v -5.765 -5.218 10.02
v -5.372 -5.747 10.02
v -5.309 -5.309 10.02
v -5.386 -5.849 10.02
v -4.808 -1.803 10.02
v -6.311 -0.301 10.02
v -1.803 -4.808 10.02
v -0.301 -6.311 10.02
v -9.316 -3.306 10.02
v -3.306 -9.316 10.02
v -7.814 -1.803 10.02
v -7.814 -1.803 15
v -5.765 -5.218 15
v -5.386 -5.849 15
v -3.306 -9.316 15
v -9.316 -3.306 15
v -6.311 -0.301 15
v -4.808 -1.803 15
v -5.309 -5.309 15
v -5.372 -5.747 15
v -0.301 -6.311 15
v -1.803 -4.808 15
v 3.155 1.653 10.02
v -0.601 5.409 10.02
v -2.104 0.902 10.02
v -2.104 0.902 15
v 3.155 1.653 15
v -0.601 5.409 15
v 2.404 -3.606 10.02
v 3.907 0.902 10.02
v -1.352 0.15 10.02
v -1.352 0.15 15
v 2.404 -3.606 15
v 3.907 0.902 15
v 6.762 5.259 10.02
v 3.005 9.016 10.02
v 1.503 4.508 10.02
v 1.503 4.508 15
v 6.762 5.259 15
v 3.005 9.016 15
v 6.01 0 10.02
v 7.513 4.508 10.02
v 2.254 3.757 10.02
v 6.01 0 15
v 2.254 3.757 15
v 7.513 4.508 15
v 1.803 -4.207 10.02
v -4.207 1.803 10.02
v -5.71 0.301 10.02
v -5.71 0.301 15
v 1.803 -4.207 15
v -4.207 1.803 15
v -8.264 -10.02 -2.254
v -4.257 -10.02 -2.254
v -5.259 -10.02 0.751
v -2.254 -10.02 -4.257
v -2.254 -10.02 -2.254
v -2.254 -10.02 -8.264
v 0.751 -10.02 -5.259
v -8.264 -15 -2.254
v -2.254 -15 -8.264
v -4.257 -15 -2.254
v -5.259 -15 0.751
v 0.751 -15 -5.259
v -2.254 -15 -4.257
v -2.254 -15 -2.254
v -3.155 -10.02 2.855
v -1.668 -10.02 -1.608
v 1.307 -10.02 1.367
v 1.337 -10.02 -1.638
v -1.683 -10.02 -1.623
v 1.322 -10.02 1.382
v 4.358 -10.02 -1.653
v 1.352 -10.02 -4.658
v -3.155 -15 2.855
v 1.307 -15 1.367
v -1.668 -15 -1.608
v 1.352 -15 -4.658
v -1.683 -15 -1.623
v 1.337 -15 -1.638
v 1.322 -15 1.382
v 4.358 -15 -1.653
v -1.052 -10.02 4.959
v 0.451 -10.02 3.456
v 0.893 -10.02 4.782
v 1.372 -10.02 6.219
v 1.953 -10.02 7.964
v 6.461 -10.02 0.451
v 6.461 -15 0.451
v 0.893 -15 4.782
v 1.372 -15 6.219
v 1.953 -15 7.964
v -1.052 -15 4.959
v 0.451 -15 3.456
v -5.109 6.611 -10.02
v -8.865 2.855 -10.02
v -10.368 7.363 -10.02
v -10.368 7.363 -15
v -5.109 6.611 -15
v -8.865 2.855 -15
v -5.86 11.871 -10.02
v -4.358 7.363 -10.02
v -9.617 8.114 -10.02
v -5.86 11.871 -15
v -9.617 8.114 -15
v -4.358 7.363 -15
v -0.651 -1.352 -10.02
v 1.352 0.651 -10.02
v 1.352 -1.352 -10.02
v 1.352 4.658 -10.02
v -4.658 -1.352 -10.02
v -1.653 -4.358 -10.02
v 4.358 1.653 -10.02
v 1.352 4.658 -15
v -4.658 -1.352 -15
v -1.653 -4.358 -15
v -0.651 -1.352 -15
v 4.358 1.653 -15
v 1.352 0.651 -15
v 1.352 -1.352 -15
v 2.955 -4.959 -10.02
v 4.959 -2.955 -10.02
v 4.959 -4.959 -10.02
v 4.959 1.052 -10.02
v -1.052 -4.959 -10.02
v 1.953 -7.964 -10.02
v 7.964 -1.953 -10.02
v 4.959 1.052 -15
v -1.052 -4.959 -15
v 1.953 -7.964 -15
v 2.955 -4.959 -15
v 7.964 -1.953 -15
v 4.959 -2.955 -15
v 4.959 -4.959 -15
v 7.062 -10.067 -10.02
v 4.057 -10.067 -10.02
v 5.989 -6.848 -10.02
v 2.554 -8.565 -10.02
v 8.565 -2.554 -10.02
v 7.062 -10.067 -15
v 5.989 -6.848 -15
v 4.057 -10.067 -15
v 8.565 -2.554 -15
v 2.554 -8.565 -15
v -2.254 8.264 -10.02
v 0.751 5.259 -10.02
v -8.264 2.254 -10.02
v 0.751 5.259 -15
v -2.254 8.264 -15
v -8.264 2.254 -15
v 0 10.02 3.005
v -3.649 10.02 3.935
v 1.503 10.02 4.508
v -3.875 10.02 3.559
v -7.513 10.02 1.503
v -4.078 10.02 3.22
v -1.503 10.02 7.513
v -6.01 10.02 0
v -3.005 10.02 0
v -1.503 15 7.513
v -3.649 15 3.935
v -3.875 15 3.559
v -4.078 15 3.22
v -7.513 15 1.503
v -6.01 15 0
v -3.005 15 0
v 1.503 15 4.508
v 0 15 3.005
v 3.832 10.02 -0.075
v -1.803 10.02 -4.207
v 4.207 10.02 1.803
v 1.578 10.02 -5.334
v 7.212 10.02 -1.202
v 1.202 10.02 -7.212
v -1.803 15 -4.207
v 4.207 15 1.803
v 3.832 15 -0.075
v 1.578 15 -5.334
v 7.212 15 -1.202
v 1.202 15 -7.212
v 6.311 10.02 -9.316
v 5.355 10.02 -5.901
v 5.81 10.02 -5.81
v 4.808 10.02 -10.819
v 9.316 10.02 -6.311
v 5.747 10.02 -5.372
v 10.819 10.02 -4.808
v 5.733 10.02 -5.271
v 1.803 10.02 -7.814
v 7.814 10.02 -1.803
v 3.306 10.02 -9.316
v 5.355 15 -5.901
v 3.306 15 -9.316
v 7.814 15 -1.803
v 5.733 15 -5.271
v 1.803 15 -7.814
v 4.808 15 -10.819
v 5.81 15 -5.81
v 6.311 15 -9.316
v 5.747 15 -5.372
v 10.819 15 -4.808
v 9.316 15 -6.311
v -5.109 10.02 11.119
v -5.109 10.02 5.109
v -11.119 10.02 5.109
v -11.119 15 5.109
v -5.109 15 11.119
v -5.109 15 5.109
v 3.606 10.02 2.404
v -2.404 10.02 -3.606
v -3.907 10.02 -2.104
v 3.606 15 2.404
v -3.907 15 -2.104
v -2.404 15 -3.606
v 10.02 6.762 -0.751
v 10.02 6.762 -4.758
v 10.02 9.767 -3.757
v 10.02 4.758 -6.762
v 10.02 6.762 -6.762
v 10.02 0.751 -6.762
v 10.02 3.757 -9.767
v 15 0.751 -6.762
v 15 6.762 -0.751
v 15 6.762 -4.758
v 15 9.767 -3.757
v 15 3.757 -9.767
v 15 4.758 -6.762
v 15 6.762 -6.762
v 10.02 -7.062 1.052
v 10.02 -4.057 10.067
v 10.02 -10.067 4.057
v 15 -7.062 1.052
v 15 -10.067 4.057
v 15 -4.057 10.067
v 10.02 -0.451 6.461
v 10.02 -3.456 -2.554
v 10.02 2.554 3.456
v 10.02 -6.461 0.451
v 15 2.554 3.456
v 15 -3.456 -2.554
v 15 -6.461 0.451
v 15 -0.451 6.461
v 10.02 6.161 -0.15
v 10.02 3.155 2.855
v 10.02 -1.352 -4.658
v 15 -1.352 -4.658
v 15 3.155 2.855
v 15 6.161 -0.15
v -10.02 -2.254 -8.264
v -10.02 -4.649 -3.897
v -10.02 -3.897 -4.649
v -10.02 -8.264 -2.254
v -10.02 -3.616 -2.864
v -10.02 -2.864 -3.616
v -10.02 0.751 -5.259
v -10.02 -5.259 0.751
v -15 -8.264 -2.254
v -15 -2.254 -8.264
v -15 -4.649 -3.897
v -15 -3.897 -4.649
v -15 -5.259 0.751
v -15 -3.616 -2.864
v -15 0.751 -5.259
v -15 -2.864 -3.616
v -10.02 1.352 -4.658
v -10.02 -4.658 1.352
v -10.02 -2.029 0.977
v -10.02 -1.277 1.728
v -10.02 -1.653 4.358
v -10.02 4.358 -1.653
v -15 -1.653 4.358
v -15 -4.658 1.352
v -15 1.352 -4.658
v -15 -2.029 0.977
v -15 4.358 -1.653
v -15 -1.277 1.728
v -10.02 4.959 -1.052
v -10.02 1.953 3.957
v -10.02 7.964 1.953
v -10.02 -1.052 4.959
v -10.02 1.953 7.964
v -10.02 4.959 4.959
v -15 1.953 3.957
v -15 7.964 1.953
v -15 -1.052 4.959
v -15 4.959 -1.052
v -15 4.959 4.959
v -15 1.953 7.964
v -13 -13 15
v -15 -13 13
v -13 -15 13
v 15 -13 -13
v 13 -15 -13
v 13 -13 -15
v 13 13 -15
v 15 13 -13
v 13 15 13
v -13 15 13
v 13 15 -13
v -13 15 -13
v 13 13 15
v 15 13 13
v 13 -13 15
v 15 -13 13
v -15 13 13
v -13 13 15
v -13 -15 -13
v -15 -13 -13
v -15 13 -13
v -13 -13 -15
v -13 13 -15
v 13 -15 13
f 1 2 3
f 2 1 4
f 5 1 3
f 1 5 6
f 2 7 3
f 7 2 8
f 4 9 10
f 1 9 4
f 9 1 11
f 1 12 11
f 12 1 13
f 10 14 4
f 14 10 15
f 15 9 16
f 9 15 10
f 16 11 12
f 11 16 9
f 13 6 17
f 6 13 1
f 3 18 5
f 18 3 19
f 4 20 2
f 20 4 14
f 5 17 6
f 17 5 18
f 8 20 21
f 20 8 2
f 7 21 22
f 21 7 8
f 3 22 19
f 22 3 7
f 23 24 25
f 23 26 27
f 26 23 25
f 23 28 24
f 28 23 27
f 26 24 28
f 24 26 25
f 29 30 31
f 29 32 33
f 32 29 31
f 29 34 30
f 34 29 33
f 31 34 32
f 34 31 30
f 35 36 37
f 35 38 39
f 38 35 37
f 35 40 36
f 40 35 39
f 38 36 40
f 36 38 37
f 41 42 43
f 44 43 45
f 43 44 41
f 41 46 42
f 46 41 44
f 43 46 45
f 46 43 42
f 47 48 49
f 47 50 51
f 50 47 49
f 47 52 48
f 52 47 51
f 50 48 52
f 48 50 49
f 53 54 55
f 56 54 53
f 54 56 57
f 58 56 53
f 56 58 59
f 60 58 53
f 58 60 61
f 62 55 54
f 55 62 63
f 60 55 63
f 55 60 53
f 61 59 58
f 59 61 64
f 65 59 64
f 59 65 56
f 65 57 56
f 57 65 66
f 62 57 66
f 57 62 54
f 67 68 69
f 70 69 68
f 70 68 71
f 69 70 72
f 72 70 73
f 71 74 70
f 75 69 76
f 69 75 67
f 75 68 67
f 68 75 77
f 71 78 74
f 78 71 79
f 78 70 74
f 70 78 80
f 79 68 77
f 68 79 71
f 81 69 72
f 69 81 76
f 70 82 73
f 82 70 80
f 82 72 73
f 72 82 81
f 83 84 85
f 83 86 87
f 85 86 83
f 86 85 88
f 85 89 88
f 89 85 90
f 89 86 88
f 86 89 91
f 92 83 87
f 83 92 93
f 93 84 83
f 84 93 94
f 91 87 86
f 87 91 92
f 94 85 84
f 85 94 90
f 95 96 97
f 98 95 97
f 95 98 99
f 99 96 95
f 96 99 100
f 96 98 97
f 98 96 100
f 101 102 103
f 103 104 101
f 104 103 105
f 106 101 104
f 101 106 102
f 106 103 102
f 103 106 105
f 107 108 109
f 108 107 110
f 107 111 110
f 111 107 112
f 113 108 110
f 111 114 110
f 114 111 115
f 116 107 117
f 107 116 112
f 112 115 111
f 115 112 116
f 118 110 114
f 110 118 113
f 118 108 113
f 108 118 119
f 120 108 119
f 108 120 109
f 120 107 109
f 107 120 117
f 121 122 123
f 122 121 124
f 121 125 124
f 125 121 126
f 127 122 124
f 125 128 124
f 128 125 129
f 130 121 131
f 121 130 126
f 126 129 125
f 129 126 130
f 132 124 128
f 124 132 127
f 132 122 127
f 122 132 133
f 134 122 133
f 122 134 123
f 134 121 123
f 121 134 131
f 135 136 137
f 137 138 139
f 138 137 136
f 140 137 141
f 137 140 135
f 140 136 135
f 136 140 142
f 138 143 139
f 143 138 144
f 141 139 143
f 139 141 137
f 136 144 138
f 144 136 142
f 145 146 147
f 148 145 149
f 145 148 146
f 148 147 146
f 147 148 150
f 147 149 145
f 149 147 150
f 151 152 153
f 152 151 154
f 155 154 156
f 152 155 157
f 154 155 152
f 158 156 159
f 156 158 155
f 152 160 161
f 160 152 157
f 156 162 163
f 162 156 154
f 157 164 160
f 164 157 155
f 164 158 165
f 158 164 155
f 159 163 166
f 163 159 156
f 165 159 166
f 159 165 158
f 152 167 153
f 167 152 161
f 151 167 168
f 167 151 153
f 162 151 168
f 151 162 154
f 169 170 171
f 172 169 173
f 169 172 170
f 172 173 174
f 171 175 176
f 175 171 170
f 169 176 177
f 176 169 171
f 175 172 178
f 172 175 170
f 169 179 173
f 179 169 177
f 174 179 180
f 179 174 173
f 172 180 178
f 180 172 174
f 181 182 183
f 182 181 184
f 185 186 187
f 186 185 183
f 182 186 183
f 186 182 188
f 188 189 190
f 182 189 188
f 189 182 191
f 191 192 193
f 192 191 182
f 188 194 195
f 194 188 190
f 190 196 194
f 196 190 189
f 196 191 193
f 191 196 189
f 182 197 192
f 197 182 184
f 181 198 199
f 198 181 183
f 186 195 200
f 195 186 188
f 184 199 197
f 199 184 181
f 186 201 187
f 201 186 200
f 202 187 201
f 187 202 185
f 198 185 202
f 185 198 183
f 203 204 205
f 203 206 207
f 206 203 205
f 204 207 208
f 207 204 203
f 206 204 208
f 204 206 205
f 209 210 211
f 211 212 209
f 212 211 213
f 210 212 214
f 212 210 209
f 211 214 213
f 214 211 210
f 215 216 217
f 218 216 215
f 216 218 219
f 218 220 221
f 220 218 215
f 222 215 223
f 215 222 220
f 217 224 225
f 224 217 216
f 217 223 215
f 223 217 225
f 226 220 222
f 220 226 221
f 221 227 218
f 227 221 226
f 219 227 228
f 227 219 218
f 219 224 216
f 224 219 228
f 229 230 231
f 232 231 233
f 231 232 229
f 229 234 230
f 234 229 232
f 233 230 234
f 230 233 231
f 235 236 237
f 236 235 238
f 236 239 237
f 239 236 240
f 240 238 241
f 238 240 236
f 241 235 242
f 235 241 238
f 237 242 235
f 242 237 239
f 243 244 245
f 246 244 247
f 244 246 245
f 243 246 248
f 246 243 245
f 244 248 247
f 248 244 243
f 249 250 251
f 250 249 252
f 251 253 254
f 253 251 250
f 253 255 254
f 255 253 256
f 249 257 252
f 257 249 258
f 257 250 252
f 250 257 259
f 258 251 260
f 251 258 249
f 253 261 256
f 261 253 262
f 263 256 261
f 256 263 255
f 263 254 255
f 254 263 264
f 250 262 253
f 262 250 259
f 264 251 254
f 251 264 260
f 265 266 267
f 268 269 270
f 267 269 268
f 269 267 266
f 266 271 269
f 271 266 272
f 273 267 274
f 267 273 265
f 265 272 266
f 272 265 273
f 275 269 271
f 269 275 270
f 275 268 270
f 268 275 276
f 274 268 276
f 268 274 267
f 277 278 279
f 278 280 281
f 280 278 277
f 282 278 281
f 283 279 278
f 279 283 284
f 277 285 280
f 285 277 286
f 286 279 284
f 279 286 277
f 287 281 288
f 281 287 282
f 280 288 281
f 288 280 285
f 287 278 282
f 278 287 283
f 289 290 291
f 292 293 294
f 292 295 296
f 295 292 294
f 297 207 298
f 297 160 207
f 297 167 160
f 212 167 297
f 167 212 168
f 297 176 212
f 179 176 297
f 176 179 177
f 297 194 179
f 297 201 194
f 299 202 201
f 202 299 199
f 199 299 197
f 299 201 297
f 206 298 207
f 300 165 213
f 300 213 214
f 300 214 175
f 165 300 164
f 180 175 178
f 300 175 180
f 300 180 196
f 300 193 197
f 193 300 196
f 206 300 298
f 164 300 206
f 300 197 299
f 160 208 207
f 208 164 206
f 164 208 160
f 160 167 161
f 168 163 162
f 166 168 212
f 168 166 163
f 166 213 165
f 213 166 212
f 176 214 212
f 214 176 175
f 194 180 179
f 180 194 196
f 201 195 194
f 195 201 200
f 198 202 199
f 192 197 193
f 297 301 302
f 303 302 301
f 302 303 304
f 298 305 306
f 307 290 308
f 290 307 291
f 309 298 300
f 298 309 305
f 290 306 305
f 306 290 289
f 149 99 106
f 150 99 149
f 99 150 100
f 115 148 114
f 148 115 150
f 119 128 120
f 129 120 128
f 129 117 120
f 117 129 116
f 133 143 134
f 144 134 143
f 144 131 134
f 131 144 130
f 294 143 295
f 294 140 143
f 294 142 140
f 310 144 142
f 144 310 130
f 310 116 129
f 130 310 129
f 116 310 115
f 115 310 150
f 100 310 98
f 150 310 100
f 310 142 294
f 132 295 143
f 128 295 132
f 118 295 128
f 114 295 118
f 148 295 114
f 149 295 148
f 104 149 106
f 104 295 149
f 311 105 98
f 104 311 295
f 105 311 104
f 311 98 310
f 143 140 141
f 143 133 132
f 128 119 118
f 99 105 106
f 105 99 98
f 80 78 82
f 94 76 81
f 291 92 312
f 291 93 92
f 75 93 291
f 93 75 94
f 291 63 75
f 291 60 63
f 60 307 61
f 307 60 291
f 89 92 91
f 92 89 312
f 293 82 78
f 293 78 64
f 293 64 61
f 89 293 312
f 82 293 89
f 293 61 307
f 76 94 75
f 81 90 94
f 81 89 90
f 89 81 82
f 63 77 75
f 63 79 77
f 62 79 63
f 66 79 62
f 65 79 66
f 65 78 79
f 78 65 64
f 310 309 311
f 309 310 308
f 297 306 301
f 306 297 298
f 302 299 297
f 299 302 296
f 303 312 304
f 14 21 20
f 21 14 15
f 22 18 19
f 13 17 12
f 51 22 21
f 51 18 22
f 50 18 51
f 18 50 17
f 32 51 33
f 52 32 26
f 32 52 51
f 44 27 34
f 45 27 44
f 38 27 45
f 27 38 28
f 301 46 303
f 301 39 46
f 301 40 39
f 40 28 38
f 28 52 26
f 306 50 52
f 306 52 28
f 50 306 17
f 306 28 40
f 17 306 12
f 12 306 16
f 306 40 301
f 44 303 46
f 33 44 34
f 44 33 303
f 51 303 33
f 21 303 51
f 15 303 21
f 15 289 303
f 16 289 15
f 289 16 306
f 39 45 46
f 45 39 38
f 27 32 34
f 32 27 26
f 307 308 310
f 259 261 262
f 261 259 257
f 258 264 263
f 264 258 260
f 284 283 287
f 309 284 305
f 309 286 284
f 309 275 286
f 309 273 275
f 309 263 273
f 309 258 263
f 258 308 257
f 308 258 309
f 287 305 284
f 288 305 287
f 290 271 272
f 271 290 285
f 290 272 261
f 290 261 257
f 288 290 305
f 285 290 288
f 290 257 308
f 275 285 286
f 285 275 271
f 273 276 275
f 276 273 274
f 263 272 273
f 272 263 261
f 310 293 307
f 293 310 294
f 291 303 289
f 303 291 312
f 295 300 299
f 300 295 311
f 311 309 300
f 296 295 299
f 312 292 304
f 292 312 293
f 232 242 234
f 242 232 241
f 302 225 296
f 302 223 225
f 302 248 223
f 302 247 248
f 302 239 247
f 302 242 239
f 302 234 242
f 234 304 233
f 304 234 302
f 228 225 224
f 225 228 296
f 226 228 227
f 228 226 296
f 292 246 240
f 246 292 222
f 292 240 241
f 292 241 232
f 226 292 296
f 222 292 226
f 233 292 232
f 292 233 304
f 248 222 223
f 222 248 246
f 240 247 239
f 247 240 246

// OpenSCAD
// [FL_INDEX: keywords="openscad, 3d_parametric, Customizable_Dice_with_Text, csg_solid" | COT="Parametric OpenSCAD design from 3DCodeverse"]
// Title: Customizable Dice with Text

// fcubewithtextv1_0
// GPLv2
// (c) 2013 TakeItAndRun
//
// v0_1:
// 
// 
//

// INCLUDE

//use <lowpolyfont v1_0.scad>;
//file pasted at end of file

//*******************************************************
//
//
//
//*******************************************************

/* [text] */

ttext1="KISS";
ttext2="EAT";
ttext3="SLEEP";
ttext4="DRINK";
ttext5="LOVE";
ttext6="HUG";

/* type */

//depth of text
dt=5;//[1:10]

//scale for all text
s0=8.5;//[1:25]
//individual text scale
s1=1.0;
s2=1.0;
s3=1.0;
s4=1.0;
s5=1.0;
s6=1.0;

/* [dice] */

//size of dice
dd=30;//[5:100]

//width of edge
de=2;//[1:10]


/* HIDDEN */

ttext=[ttext1,ttext2,ttext3,ttext4,ttext5,ttext6];
s=s0*[s1,s2,s3,s4,s5,s6];

//*******************************************************
//
// basic definitions
//
//*******************************************************


// circle have $fn facets
$fn=32;

// small displacement to avoid parallel faces with zero volume
e=0.02;

// unit vectors
xaxis=[1,0,0];
yaxis=[0,1,0];
zaxis=[0,0,1];

// golden ratio
phi=(1+sqrt(5))/2;

//*******************************************************
//
// dimensions
//
//*******************************************************

dxprint=3;

col1="red";
col2="lime";


//*******************************************************
//
// routines
//
//*******************************************************

module fcube(v=[dd,dd,dd],f=de,center=false){
	translate(center?0:f*[1,1,1])
	minkowski(){
		cube(v-2*f*[1,1,1],center);
		scale(f)polyhedron(
			[[1,0,0],[0,1,0],[-1,0,0],[0,-1,0],[0,0,1],[0,0,-1]],
			[[0,1,4],[1,2,4],[2,3,4],[3,0,4],[1,0,5],[2,1,5],[3,2,5],[0,3,5]]
		);
	}
}

a=[[0,0,0],[90,0,0],[180,0,0],[270,0,0],[0,90,0],[0,270,0]];

module dice(){
	difference(){
		color("blue")
		fcube(center=true);
		for(i=[0:5])
			rotate(a[i])
			translate((dd/2-dt+e)*zaxis)
			rotate(45)
			scale([s[i]/10,s[i]/10,dt/2])
				color("yellow")
				type(ttext[i],center=true);
	}
}



//*******************************************************
//
// main program
//
//*******************************************************

dice();



// INCLUDE

// lowpolyfont v1_0
// GPLv2
// (c) 2013 TakeItAndRun
//
// v1_1: 
//

/*





*/
//*******************************************************
//
// Low polygon count font
//
//*******************************************************



//*******************************************************
//
// basic definitions
//
//*******************************************************


// small displacement to avoid parallel faces with zero volume
e=+0.02;

// unit vectors
xaxis=+[1,0,0];
yaxis=+[0,1,0];
zaxis=+[0,0,1];

//*******************************************************
//
// dimensions
//
//*******************************************************

/* [text] */

//number of lines
nl=4;//[1:4]

// Text (ONLY CAPITALS!)
text1="THE QUICK BROWN";
text2="FOX JUMBED OVER";
text3="THE LAZY DOG.";
text4="1234567890.:!?";



/* [type] */

//thickness of type
t=2;//[.1:10]

//height of type
h=10;//[1:50]

//width of type
w=5;//[1:50]

//spacing between letters
d=1;//[0.0:5.0]
dpos=d;

//conical shape
//pq=40;//[0:100]
//q=pq/100;

// spacing between lines
dl=4;//[0.0:10:0]

/* [sign] */

// sign
sign=!false;//[false:none,true:sign]
//length past type
dsx=3;//[0:10]
//height above type
dsy=3;//[0:10]
//thickness of the sign
sz=1;//[1:10]
// edge
edge=!false;//[false:none,true:sign]
// width of edge
we=1;//[0.1:10.0]


/* [Hidden] */

text=["",text1,text2,text3,text4];


//*******************************************************
//
// polygons of the letters:
//	Every letter is one element of the array fo:
// the first number is the width of the letter
//	then follows a list of polygons
//
//	the key to the (order of the) letters is the string str0
//
//*******************************************************

str0=" ABCDEFGHIJKLMNOPQRSTUVWXYZ1234567890.:!?";

fo=
[
[
// space
2,
[],

],[
//A
2,
[[0,2],[1,4],[2,2]],
[[0,2+e],[2,2+e],[0,0]],
[[0,2+e],[2,2+e],[2,0]],
],[
//B
2,
[[0,4],[2,3],[0,1.5]],
[[0,2.5],[2,1],[0,0]],
],[
//C
2,
[[0,2],[2,4],[2,0]],
],[
//D
2,
[[0,4],[2,2],[0,0]],
],[
//E
2,
[[0,4],[2,4],[0,0]],
[[0,4],[2,0],[0,0]],
[[0,4],[2,2],[0,0]],
],[
//F
2,
[[0,4],[2,4],[0,0]],
],[
//G
2,
[[0,4],[2,4],[0,0]],
[[0,1],[2,2],[2,0],[0,0]],
],[
//H
2,
[[0,4],[.75,2],[0,0]],
[[1.25,2],[2,4],[2,0]],
[[0,2.25],[2,2.25],[2,1.75],[0,1.75]],
],[
//I
1,
[[0,4],[1,4],[1,0]],
],[
//J
1,
[[1,4],[1,0],[0,0]],
],[
//K
2,
[[0,4],[1,4],[0,0]],
[[0,1.5],[2,4],[2,3]],
[[0,2.5],[2,1],[2,0]],
],[
//L
2,
[[0,4],[2,0],[0,0]],
],[
//M
2,
[[0,4],[2,2],[2,0],[0,0]],
[[2,4],[2,0],[0,0],[0,2]],
],[
//N
2,
[[0,4],[2,3],[0,0]],
[[0,1],[2,4],[2,0]],
],[
//O
2,
[[0,4],[2,4],[2,0],[0,0]],
],[
//P
2,
[[1,4],[2,3],[0,2]],
[[0,4],[1,4],[0,0]],
],[
//Q
2,
[[0,4],[2,4],[2,1.25],[.75,0],[0,0]],
[[0,2],[2,.5],[2,0],[1.5,0]],
//[[1.5,1],[2,0],[1,.5]],
],[
//R
2,
[[0,4],[1,4],[0,0]],
[[0,2],[1,4],[2,3]],
[[0,2.5],[2,1],[2,0]],
],[
//S
2,
[[2,4],[2,1.5],[0,3]],
[[0,2.5],[2,1],[0,0]],
],[
//T
2,
[[0.5,4],[1.25,4],[1,0]],
[[0,4],[2,4],[0,3]],
],[
//U
2,
[[0,4],[1,0],[0,0]],
[[2,4],[2,0],[1,0]],
[[0,0],[0,1],[2,1],[2,0]],
],[
//V
2,
[[0,4],[2,4],[1,0]],
],[
//W
2,
[[0,4],[2,4],[2,0],[0,2]],
[[0,4],[2,4],[2,2],[0,0]],
],[
//X
2,
[[0,4],[1.5,2],[.5,2]],
[[2,4],[1.5,2],[.5,2]],
[[0,0],[.5,2],[1.5,2]],
[[2,0],[.5,2],[1.5,2]],
],[
//Y
2,
[[0,4],[2,4],[1,2]],
[[0.5,4],[1.25,4],[1,0]],
],[
//Z
2,
[[0,4],[2,4],[2,3]],
[[0,0],[0,1],[2,0]],
[[0,1],[1.5,4],[2,3],[.5,0]],
],[
//1
1,
[[0,0],[1,4],[1,0]],
[[0,4],[1,4],[1,3]],
],[
//2
2,
[[0,4],[2,3],[0,2]],
[[0,0],[0,1],[2,0]],
[[0,1],[1.5,3],[2,3],[0,0]],
],[
//3
2,
[[0,4],[2,3],[0,2]],
[[0,0],[0,2+e],[2,1]],
],[
//4
2,
[[1,0],[2,4],[2,0]],
[[0,4],[2,2],[0,2]],
],[
//5
2,
[[0,4],[2,4],[0,2]],
[[0,0],[0,2+e],[2,1]],
],[
//6
2,
[[1,0],[0,1],[1,2],[2,1]],
[[0,4],[1,4],[.25,1],[0,1]],
],[
//7
2,
//[[0,4],[2,4],[2,3.5],[0,3]],
//[[0,4],[1,4],[.25,1],[0,1]],
[[0,4],[2,4],[2,0]],
],[
//8
2,
[[1,0],[0,1],[1,2+e],[2,1]],
[[1,4],[2,3],[1,2],[0,3]],
],[
//9
2,
[[1,4],[2,3],[1,2],[0,3]],
[[1,0],[1.75,3],[2,3],[2,0]],
],[
//0
2,
[[1,0],[0,1],[0,3],[1,4],[2,3],[2,1]],
],[
//.
1,
[[0,0],[1,1],[1,0]],
],[
//:
1,
[[0,0],[1,1],[1,0]],
[[0,2],[1,3],[1,2]],
],[
//!
1,
[[0,0],[1,1],[1,0]],
[[0,4],[1,4],[.5,1+e]],
],[
//?
2,
[[0.5,0],[1.5,1],[1.5,0]],
[[1,4],[2,4],[1,1+e]],
[[0,4],[2,4],[0,3]],
],[

]
];


//*******************************************************
//
// routines
//
//*******************************************************

// make the i-th letter in the string str0
module letter(s){
	for(i=[1:len(fo[s])-1]){
// comment out the line with linear_extrude to get a 2-dim output for a dxf export
	linear_extrude(height=t)
		scale([w/2,h/4])polygon(fo[s][i]);
	}
}

// print one line of text 
// str: text to be printed (use only letters that are included in the string str0 (capital letters, numbers, some special characters)
module type(str,center=false){
	translate([(center)?-(pos(len(str),str)-dpos/2)/2:0,(center)?-h/2:0,0])
	for(i=[0:len(str)-1]){
		translate(pos(i,str)*xaxis)
		letter(index(str[i],str0));
	}
}


module sign(){
// calculate x,y-dimensions of the sign
	ssx=maximum(nl)+2*dsx+((edge)?4*we:0);
	ssy=nl*h+(nl-1)*dl+2*dsy+((edge)?4*we:0);

	color("yellow")
	translate((nl-1)*(h+dl)/2*yaxis+((sign)?sz:0)*zaxis)
	for (i=[1:nl]){
		translate(-(i-1)*(h+dl)*yaxis)
			type(text[i],true);
	}
	if (sign){
		color("blue")
		translate(sz/2*zaxis)
			cube([ssx,ssy,sz],true);
		color("yellow")
		translate((sz+t/2)*zaxis)
			for(m=[-1,1]){
				translate(m*(ssy-3*we)/2*yaxis)
					cube([ssx-2*we,we,t],true);
				translate(m*(ssx-3*we)/2*xaxis)
					cube([we,ssy-2*we,t],true);
			}
	}
}



// get the length of the longest line
function maximum(nl,i=1)=(i<nl)?
	max((pos(len(text[i]),text[i])-dpos/2),maximum(nl,i+1)):
	(pos(len(text[i]),text[i])-dpos/2)
;

// return index of a letter in the fo vector / string str0
function index(str)=
	search(str,str0)[0];


// Calculate the position of the i-th letter as sum of the
// width plus spacing of all the letters before it.
// This function looks so witty because OpenSCAD does not
// allow re-assignment of variables during run time.
// The idea for this function (somewhat simplified) I took from
// http://www.thingiverse.com/thing:22730
// by Bernhard -HotKey- Slawik, http://www.bernhardslawik.de
// This function is defined only for 80 characters. You may 
// expand it if you need more than 80 characters per line.
function pos(i,str)=
	w/2*(
	(i==0)?0:i*dpos*2/w
	+((i>=1)?fo[index(str[0])][0]:0)
	+((i>=2)?fo[index(str[1])][0]:0)
	+((i>=3)?fo[index(str[2])][0]:0)
	+((i>=4)?fo[index(str[3])][0]:0)
	+((i>=5)?fo[index(str[4])][0]:0)
	+((i>=6)?fo[index(str[5])][0]:0)
	+((i>=7)?fo[index(str[6])][0]:0)
	+((i>=8)?fo[index(str[7])][0]:0)
	+((i>=9)?fo[index(str[8])][0]:0)
	+((i>=10)?fo[index(str[9])][0]:0)
	+((i>=11)?fo[index(str[10])][0]:0)
	+((i>=12)?fo[index(str[11])][0]:0)
	+((i>=13)?fo[index(str[12])][0]:0)
	+((i>=14)?fo[index(str[13])][0]:0)
	+((i>=15)?fo[index(str[14])][0]:0)
	+((i>=16)?fo[index(str[15])][0]:0)
	+((i>=17)?fo[index(str[16])][0]:0)
	+((i>=18)?fo[index(str[17])][0]:0)
	+((i>=19)?fo[index(str[18])][0]:0)
	+((i>=20)?fo[index(str[19])][0]:0)
	+((i>=21)?fo[index(str[20])][0]:0)
	+((i>=22)?fo[index(str[21])][0]:0)
	+((i>=23)?fo[index(str[22])][0]:0)
	+((i>=24)?fo[index(str[23])][0]:0)
	+((i>=25)?fo[index(str[24])][0]:0)
	+((i>=26)?fo[index(str[25])][0]:0)
	+((i>=27)?fo[index(str[26])][0]:0)
	+((i>=28)?fo[index(str[27])][0]:0)
	+((i>=29)?fo[index(str[28])][0]:0)
	+((i>=30)?fo[index(str[29])][0]:0)
	+((i>=31)?fo[index(str[30])][0]:0)
	+((i>=32)?fo[index(str[31])][0]:0)
	+((i>=33)?fo[index(str[32])][0]:0)
	+((i>=34)?fo[index(str[33])][0]:0)
	+((i>=35)?fo[index(str[34])][0]:0)
	+((i>=36)?fo[index(str[35])][0]:0)
	+((i>=37)?fo[index(str[36])][0]:0)
	+((i>=38)?fo[index(str[37])][0]:0)
	+((i>=39)?fo[index(str[38])][0]:0)
	+((i>=40)?fo[index(str[39])][0]:0)
	+((i>=41)?fo[index(str[40])][0]:0)
	+((i>=42)?fo[index(str[41])][0]:0)
	+((i>=43)?fo[index(str[42])][0]:0)
	+((i>=44)?fo[index(str[43])][0]:0)
	+((i>=45)?fo[index(str[44])][0]:0)
	+((i>=46)?fo[index(str[45])][0]:0)
	+((i>=47)?fo[index(str[46])][0]:0)
	+((i>=48)?fo[index(str[47])][0]:0)
	+((i>=49)?fo[index(str[48])][0]:0)
	+((i>=50)?fo[index(str[49])][0]:0)
	+((i>=51)?fo[index(str[50])][0]:0)
	+((i>=52)?fo[index(str[51])][0]:0)
	+((i>=53)?fo[index(str[52])][0]:0)
	+((i>=54)?fo[index(str[53])][0]:0)
	+((i>=55)?fo[index(str[54])][0]:0)
	+((i>=56)?fo[index(str[55])][0]:0)
	+((i>=57)?fo[index(str[56])][0]:0)
	+((i>=58)?fo[index(str[57])][0]:0)
	+((i>=59)?fo[index(str[58])][0]:0)
	+((i>=60)?fo[index(str[59])][0]:0)
	+((i>=61)?fo[index(str[60])][0]:0)
	+((i>=62)?fo[index(str[61])][0]:0)
	+((i>=63)?fo[index(str[62])][0]:0)
	+((i>=64)?fo[index(str[63])][0]:0)
	+((i>=65)?fo[index(str[64])][0]:0)
	+((i>=66)?fo[index(str[65])][0]:0)
	+((i>=67)?fo[index(str[66])][0]:0)
	+((i>=68)?fo[index(str[67])][0]:0)
	+((i>=69)?fo[index(str[68])][0]:0)
	+((i>=70)?fo[index(str[69])][0]:0)
	+((i>=71)?fo[index(str[70])][0]:0)
	+((i>=72)?fo[index(str[71])][0]:0)
	+((i>=73)?fo[index(str[72])][0]:0)
	+((i>=74)?fo[index(str[73])][0]:0)
	+((i>=75)?fo[index(str[74])][0]:0)
	+((i>=76)?fo[index(str[75])][0]:0)
	+((i>=77)?fo[index(str[76])][0]:0)
	+((i>=78)?fo[index(str[77])][0]:0)
	+((i>=79)?fo[index(str[78])][0]:0)
	+((i>=80)?fo[index(str[79])][0]:0)
	)
//	+((i>=4)?fo[index(str[4])][0]:0)

;


//*******************************************************
//
// main program
//
//*******************************************************



// one line of text
//str="THE QUICK BROWN FOX JUMBED OVER THE LAZY DOG.";
//str=str0;
//type(str,!true);

// sign with up to 4 lines of text (if sign=true, else just the text)
//sign();
